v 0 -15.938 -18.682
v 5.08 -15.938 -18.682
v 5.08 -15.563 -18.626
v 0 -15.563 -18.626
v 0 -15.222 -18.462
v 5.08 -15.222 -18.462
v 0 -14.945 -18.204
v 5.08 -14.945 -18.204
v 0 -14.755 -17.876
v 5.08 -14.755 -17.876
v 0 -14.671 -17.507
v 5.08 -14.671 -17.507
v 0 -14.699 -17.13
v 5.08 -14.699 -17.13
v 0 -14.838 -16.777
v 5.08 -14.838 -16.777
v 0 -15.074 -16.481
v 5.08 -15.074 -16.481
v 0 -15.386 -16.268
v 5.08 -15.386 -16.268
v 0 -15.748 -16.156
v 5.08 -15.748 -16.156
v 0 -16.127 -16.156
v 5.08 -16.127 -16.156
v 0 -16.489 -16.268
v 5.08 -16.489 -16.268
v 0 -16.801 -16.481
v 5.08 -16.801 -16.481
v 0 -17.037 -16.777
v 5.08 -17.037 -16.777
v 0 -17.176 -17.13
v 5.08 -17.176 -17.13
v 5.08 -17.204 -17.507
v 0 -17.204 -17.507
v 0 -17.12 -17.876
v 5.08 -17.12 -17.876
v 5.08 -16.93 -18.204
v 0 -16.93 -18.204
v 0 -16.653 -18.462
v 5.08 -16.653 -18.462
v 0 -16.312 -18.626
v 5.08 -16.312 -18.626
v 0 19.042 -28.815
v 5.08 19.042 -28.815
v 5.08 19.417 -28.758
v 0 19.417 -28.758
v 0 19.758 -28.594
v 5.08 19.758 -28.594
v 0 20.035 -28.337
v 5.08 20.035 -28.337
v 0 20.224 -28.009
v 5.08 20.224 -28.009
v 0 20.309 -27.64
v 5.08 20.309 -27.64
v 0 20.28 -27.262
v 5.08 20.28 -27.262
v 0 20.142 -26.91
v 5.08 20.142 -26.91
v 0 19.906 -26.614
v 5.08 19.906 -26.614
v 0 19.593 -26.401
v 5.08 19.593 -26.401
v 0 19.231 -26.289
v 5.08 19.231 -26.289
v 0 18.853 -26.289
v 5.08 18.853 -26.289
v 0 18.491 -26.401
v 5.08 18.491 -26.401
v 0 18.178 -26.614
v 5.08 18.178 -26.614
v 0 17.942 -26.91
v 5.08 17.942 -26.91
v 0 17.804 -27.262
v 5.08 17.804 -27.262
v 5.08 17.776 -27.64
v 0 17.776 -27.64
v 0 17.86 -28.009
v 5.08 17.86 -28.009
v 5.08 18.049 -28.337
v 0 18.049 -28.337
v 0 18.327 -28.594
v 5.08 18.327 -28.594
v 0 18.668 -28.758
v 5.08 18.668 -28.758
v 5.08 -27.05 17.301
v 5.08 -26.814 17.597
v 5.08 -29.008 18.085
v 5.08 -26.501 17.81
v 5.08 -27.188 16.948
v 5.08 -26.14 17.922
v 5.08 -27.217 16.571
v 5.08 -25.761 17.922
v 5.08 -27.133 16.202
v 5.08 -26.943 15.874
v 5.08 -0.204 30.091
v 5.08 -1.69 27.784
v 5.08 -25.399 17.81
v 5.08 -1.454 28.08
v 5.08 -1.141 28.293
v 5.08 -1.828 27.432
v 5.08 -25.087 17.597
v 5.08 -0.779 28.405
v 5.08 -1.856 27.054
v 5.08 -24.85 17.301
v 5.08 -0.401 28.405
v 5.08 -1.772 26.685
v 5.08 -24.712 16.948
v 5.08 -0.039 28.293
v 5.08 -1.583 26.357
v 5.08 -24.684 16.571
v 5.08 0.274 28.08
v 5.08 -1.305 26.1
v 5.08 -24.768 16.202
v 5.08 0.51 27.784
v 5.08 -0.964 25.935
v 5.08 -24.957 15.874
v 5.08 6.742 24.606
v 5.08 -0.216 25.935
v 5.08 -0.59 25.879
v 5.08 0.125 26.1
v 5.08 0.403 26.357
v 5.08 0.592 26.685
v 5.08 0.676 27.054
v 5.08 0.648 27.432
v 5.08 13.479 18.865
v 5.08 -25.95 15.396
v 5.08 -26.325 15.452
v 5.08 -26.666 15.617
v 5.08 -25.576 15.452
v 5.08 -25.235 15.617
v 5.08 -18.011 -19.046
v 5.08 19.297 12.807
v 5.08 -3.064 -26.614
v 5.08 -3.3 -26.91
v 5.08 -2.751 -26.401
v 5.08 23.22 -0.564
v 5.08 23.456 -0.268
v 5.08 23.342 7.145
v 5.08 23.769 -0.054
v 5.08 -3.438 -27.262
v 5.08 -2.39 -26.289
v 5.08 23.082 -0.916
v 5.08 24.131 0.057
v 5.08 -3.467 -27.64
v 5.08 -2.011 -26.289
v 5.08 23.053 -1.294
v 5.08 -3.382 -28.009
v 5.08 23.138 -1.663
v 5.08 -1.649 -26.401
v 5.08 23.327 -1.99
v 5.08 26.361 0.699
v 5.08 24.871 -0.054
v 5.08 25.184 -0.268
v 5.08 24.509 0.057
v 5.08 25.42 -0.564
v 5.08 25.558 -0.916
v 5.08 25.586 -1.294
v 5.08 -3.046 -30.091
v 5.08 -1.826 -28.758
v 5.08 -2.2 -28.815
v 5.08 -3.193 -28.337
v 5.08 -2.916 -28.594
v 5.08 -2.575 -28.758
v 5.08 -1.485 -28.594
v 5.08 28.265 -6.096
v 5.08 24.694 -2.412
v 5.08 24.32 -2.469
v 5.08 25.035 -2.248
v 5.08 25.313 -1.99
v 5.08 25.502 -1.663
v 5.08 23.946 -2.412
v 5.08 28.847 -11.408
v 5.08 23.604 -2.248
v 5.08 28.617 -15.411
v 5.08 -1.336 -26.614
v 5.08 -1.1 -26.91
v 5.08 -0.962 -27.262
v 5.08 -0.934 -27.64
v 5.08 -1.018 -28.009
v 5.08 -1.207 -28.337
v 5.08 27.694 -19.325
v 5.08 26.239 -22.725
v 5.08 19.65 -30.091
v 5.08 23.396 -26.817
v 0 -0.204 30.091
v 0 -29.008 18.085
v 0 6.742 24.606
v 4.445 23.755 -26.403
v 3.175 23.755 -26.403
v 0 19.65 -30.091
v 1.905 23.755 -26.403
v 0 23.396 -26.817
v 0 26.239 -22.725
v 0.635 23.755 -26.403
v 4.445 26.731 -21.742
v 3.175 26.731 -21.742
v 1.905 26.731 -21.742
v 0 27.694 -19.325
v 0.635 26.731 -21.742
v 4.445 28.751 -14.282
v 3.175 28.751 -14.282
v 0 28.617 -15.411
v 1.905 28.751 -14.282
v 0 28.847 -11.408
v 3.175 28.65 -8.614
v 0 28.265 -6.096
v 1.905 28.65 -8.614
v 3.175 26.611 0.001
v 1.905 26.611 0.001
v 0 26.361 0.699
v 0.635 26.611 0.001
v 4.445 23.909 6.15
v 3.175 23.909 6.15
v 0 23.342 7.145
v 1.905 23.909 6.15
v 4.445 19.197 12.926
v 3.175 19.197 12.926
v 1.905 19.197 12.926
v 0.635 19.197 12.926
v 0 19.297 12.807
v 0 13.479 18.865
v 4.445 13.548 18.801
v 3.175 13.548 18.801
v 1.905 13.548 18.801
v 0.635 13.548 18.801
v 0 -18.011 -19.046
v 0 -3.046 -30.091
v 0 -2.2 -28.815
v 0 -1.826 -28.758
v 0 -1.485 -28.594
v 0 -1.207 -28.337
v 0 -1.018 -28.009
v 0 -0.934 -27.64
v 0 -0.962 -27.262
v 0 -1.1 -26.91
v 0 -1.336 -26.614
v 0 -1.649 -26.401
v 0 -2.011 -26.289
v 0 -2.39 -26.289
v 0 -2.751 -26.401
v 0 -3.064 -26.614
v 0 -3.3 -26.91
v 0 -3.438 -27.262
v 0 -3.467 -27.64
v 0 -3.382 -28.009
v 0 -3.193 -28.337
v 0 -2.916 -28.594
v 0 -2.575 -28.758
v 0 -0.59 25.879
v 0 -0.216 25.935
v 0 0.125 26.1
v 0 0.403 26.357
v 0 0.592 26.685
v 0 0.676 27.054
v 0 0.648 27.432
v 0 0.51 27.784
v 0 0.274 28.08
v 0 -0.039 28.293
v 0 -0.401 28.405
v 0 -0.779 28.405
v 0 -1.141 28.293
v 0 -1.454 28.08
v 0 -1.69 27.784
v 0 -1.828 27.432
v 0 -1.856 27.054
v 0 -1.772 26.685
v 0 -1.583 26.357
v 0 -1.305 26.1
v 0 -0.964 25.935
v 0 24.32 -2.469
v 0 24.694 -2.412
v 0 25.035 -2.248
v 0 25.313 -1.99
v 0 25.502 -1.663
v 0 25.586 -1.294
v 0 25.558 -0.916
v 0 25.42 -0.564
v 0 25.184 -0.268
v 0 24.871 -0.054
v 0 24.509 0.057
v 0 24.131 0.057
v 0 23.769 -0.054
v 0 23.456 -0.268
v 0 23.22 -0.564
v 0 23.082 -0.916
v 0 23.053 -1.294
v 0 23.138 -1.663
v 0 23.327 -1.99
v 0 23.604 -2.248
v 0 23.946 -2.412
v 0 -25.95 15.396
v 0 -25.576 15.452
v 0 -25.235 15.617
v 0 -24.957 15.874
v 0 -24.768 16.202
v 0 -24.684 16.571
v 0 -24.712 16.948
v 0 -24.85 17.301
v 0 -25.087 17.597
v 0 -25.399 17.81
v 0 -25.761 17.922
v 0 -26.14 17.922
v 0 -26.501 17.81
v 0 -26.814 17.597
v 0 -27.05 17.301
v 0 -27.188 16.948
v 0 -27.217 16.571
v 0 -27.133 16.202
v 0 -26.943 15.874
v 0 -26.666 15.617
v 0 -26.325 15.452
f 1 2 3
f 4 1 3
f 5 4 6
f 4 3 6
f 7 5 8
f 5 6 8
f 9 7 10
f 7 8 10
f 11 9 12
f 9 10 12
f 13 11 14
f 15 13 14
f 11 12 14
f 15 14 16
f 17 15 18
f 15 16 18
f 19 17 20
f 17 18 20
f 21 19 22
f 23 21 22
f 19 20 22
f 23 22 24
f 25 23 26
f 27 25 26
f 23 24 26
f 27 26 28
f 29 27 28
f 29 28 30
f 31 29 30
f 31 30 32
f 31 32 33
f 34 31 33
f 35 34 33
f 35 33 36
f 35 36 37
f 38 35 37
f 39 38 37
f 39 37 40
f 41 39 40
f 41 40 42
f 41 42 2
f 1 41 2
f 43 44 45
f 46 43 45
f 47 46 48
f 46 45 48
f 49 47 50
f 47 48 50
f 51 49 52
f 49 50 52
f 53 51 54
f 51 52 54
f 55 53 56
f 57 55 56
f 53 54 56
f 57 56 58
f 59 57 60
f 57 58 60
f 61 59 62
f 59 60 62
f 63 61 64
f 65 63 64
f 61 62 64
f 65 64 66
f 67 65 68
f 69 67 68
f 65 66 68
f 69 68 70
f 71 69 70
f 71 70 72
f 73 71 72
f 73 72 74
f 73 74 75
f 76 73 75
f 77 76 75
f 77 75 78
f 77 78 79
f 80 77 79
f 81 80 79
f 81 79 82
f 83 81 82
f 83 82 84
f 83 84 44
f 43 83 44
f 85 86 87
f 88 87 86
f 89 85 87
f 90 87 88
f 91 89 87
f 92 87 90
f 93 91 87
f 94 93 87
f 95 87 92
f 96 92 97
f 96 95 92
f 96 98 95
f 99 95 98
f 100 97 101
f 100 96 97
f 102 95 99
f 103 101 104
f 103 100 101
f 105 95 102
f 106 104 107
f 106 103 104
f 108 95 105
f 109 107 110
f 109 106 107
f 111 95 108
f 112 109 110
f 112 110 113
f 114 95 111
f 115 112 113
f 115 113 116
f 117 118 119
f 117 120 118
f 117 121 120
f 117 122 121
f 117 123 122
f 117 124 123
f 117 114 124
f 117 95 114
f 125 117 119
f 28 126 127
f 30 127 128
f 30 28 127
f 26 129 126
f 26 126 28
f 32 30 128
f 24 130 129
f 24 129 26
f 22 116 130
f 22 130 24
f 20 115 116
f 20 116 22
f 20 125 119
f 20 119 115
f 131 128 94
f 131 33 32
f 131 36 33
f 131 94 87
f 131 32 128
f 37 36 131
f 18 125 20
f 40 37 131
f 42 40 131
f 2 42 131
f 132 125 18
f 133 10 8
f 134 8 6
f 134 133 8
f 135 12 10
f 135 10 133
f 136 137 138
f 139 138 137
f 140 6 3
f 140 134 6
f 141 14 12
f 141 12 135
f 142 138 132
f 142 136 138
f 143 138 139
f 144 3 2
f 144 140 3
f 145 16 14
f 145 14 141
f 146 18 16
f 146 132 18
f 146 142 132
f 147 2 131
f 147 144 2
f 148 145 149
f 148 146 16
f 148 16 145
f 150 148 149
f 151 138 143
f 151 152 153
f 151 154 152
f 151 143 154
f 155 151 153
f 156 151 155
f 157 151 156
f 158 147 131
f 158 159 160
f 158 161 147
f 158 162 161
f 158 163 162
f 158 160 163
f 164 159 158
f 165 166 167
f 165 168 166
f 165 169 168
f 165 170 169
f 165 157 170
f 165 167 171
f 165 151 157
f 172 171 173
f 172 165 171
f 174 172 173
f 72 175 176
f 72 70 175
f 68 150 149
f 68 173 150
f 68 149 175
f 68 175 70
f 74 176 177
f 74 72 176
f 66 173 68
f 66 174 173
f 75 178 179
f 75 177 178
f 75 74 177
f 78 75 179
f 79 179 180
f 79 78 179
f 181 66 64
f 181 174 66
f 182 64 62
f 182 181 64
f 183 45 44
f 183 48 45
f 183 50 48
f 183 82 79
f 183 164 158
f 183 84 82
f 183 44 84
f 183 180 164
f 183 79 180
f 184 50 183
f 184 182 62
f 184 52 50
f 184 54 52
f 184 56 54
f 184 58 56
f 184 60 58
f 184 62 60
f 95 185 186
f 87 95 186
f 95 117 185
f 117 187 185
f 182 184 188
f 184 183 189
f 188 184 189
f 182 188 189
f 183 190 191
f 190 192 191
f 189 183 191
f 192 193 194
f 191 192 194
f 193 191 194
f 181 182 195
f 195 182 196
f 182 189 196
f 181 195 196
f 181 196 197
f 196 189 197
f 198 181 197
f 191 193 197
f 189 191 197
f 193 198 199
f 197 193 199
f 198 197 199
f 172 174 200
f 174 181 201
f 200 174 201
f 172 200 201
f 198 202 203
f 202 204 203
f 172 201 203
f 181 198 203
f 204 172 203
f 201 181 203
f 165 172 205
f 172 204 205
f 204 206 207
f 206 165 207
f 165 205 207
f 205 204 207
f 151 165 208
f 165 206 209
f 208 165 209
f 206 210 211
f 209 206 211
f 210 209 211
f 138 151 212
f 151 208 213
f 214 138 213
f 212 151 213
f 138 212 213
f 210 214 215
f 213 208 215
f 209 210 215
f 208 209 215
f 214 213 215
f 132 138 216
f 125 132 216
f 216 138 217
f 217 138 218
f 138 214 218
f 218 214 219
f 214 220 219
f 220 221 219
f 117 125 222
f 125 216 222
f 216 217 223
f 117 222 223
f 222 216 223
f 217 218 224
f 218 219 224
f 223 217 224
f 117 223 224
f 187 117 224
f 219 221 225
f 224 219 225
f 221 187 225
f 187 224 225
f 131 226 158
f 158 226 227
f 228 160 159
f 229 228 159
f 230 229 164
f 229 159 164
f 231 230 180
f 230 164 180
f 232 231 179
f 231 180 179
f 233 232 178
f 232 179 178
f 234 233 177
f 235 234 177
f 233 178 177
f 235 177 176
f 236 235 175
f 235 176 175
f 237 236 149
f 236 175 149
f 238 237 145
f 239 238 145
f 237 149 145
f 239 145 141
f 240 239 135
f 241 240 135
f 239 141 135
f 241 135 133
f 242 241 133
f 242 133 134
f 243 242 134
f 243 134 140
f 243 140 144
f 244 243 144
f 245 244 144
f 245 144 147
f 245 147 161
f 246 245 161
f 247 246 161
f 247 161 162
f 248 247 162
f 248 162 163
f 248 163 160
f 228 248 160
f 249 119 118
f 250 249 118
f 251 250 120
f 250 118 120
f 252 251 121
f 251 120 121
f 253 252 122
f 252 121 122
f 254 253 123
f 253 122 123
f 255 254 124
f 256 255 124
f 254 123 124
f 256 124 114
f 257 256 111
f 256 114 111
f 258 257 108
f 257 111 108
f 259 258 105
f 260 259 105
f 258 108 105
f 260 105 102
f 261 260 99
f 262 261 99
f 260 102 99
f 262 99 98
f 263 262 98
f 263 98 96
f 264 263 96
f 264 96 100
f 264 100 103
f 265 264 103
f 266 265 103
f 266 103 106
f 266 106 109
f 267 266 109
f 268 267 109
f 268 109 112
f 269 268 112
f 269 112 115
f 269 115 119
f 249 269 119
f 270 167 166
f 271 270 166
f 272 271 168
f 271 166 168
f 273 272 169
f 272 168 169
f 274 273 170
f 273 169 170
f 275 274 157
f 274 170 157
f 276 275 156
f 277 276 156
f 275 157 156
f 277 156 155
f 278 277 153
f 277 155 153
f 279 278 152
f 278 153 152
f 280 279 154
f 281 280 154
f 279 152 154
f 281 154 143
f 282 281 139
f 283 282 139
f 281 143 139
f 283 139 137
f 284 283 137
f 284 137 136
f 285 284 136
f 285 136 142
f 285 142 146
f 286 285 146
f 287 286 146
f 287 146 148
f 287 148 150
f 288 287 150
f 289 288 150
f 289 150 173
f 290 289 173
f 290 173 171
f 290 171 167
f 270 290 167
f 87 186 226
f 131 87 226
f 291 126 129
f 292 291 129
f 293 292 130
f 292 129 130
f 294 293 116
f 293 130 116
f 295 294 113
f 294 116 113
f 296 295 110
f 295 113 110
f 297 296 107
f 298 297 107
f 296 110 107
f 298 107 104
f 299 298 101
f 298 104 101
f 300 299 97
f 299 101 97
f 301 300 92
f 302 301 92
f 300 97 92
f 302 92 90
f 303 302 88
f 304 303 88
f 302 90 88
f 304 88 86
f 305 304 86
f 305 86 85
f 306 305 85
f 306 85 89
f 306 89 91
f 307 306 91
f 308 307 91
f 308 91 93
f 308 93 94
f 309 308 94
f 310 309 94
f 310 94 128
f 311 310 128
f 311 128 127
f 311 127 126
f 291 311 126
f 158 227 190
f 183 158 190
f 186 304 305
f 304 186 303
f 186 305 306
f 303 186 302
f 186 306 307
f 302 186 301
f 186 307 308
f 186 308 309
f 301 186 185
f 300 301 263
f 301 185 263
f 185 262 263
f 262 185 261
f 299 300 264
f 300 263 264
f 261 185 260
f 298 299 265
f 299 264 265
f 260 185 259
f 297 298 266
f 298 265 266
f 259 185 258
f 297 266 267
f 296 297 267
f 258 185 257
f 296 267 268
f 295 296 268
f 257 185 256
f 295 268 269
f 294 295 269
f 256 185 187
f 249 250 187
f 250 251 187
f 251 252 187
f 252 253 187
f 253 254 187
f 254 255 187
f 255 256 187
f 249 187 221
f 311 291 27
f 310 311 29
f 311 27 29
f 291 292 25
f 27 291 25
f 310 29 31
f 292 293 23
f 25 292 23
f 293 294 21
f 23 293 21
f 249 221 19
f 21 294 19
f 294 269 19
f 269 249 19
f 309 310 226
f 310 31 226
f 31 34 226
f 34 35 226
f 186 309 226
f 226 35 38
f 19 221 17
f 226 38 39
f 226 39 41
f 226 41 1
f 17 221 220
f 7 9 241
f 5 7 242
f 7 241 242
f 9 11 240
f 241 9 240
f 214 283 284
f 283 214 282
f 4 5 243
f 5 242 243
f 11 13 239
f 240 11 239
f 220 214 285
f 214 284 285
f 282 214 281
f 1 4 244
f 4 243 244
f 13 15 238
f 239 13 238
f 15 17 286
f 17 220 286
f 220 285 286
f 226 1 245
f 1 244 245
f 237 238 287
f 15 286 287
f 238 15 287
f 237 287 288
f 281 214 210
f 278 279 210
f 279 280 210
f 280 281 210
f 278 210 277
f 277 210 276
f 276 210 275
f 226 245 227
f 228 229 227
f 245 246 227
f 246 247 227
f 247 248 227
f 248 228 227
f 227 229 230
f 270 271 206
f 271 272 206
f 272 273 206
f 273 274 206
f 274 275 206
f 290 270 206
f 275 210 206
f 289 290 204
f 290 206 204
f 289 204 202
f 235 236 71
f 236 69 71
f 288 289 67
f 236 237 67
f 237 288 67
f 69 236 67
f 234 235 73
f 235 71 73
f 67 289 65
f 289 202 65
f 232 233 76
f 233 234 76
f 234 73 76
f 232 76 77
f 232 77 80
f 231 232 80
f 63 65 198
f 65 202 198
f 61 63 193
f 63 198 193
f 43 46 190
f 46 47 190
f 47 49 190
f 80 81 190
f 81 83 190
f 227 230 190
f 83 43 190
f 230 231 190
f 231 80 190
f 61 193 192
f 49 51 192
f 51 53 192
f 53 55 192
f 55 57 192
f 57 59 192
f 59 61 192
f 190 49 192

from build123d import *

# Parameters (mm, degrees)
BOSS_EXTRUDE1_DEPTH = 5.08
SKETCH2_R           = 1.27
CUT_EXTRUDE1_DEPTH  = 10


with BuildPart() as part:
    # Sketch1 → Boss-Extrude1 (new body)
    with BuildSketch(Plane(origin=(0, 0, 0), x_dir=(0, 0, -1), z_dir=(1, 0, 0))):
        with BuildLine():
            Line((-30.090800845, -0.203985657), (-18.085491541, -29.008366119))
            Line((-18.085491541, -29.008366119), (19.045846251, -18.010521201))
            Line((19.045846251, -18.010521201), (30.090800845, -3.045918822))
            Line((30.090800845, -3.045918822), (30.090800845, 19.650147268))
            add(Edge.make_bspline(
                [(30.090800845, 19.650147268), (28.037602076, 22.726688549), (23.033153586, 26.860701903), (14.987767723, 29.008366119), (7.524677055, 28.774184664), (0.603908496, 27.036559666), (-6.727735861, 23.899909345), (-13.041122451, 19.375109172), (-21.198561263, 11.380500033), (-26.40610074, 4.431018315), (-30.090800845, -0.203985657)],
                knots=[0, 0, 0, 0, 0.148846654, 0.252987858, 0.329376305, 0.448668947, 0.539169161, 0.650373484, 0.760197294, 1, 1, 1, 1], degree=3))
        make_face()
    extrude(amount=BOSS_EXTRUDE1_DEPTH)

    # Sketch2 → Cut-Extrude1 (cut)
    with BuildSketch(Plane(origin=(5.08, 0, 0), x_dir=(0, 0, -1), z_dir=(1, 0, 0))):
        with Locations((-27.1490755, -0.589985571)):
            Circle(SKETCH2_R)
        with Locations((-16.665824451, -25.950337288)):
            Circle(SKETCH2_R)
        with Locations((17.412184036, -15.937519564)):
            Circle(SKETCH2_R)
        with Locations((27.54487652, -2.200233664)):
            Circle(SKETCH2_R)
        with Locations((27.54487652, 19.042163131)):
            Circle(SKETCH2_R)
        with Locations((1.198662119, 24.319887944)):
            Circle(SKETCH2_R)
    extrude(amount=-CUT_EXTRUDE1_DEPTH, mode=Mode.SUBTRACT)


solid = part.part
